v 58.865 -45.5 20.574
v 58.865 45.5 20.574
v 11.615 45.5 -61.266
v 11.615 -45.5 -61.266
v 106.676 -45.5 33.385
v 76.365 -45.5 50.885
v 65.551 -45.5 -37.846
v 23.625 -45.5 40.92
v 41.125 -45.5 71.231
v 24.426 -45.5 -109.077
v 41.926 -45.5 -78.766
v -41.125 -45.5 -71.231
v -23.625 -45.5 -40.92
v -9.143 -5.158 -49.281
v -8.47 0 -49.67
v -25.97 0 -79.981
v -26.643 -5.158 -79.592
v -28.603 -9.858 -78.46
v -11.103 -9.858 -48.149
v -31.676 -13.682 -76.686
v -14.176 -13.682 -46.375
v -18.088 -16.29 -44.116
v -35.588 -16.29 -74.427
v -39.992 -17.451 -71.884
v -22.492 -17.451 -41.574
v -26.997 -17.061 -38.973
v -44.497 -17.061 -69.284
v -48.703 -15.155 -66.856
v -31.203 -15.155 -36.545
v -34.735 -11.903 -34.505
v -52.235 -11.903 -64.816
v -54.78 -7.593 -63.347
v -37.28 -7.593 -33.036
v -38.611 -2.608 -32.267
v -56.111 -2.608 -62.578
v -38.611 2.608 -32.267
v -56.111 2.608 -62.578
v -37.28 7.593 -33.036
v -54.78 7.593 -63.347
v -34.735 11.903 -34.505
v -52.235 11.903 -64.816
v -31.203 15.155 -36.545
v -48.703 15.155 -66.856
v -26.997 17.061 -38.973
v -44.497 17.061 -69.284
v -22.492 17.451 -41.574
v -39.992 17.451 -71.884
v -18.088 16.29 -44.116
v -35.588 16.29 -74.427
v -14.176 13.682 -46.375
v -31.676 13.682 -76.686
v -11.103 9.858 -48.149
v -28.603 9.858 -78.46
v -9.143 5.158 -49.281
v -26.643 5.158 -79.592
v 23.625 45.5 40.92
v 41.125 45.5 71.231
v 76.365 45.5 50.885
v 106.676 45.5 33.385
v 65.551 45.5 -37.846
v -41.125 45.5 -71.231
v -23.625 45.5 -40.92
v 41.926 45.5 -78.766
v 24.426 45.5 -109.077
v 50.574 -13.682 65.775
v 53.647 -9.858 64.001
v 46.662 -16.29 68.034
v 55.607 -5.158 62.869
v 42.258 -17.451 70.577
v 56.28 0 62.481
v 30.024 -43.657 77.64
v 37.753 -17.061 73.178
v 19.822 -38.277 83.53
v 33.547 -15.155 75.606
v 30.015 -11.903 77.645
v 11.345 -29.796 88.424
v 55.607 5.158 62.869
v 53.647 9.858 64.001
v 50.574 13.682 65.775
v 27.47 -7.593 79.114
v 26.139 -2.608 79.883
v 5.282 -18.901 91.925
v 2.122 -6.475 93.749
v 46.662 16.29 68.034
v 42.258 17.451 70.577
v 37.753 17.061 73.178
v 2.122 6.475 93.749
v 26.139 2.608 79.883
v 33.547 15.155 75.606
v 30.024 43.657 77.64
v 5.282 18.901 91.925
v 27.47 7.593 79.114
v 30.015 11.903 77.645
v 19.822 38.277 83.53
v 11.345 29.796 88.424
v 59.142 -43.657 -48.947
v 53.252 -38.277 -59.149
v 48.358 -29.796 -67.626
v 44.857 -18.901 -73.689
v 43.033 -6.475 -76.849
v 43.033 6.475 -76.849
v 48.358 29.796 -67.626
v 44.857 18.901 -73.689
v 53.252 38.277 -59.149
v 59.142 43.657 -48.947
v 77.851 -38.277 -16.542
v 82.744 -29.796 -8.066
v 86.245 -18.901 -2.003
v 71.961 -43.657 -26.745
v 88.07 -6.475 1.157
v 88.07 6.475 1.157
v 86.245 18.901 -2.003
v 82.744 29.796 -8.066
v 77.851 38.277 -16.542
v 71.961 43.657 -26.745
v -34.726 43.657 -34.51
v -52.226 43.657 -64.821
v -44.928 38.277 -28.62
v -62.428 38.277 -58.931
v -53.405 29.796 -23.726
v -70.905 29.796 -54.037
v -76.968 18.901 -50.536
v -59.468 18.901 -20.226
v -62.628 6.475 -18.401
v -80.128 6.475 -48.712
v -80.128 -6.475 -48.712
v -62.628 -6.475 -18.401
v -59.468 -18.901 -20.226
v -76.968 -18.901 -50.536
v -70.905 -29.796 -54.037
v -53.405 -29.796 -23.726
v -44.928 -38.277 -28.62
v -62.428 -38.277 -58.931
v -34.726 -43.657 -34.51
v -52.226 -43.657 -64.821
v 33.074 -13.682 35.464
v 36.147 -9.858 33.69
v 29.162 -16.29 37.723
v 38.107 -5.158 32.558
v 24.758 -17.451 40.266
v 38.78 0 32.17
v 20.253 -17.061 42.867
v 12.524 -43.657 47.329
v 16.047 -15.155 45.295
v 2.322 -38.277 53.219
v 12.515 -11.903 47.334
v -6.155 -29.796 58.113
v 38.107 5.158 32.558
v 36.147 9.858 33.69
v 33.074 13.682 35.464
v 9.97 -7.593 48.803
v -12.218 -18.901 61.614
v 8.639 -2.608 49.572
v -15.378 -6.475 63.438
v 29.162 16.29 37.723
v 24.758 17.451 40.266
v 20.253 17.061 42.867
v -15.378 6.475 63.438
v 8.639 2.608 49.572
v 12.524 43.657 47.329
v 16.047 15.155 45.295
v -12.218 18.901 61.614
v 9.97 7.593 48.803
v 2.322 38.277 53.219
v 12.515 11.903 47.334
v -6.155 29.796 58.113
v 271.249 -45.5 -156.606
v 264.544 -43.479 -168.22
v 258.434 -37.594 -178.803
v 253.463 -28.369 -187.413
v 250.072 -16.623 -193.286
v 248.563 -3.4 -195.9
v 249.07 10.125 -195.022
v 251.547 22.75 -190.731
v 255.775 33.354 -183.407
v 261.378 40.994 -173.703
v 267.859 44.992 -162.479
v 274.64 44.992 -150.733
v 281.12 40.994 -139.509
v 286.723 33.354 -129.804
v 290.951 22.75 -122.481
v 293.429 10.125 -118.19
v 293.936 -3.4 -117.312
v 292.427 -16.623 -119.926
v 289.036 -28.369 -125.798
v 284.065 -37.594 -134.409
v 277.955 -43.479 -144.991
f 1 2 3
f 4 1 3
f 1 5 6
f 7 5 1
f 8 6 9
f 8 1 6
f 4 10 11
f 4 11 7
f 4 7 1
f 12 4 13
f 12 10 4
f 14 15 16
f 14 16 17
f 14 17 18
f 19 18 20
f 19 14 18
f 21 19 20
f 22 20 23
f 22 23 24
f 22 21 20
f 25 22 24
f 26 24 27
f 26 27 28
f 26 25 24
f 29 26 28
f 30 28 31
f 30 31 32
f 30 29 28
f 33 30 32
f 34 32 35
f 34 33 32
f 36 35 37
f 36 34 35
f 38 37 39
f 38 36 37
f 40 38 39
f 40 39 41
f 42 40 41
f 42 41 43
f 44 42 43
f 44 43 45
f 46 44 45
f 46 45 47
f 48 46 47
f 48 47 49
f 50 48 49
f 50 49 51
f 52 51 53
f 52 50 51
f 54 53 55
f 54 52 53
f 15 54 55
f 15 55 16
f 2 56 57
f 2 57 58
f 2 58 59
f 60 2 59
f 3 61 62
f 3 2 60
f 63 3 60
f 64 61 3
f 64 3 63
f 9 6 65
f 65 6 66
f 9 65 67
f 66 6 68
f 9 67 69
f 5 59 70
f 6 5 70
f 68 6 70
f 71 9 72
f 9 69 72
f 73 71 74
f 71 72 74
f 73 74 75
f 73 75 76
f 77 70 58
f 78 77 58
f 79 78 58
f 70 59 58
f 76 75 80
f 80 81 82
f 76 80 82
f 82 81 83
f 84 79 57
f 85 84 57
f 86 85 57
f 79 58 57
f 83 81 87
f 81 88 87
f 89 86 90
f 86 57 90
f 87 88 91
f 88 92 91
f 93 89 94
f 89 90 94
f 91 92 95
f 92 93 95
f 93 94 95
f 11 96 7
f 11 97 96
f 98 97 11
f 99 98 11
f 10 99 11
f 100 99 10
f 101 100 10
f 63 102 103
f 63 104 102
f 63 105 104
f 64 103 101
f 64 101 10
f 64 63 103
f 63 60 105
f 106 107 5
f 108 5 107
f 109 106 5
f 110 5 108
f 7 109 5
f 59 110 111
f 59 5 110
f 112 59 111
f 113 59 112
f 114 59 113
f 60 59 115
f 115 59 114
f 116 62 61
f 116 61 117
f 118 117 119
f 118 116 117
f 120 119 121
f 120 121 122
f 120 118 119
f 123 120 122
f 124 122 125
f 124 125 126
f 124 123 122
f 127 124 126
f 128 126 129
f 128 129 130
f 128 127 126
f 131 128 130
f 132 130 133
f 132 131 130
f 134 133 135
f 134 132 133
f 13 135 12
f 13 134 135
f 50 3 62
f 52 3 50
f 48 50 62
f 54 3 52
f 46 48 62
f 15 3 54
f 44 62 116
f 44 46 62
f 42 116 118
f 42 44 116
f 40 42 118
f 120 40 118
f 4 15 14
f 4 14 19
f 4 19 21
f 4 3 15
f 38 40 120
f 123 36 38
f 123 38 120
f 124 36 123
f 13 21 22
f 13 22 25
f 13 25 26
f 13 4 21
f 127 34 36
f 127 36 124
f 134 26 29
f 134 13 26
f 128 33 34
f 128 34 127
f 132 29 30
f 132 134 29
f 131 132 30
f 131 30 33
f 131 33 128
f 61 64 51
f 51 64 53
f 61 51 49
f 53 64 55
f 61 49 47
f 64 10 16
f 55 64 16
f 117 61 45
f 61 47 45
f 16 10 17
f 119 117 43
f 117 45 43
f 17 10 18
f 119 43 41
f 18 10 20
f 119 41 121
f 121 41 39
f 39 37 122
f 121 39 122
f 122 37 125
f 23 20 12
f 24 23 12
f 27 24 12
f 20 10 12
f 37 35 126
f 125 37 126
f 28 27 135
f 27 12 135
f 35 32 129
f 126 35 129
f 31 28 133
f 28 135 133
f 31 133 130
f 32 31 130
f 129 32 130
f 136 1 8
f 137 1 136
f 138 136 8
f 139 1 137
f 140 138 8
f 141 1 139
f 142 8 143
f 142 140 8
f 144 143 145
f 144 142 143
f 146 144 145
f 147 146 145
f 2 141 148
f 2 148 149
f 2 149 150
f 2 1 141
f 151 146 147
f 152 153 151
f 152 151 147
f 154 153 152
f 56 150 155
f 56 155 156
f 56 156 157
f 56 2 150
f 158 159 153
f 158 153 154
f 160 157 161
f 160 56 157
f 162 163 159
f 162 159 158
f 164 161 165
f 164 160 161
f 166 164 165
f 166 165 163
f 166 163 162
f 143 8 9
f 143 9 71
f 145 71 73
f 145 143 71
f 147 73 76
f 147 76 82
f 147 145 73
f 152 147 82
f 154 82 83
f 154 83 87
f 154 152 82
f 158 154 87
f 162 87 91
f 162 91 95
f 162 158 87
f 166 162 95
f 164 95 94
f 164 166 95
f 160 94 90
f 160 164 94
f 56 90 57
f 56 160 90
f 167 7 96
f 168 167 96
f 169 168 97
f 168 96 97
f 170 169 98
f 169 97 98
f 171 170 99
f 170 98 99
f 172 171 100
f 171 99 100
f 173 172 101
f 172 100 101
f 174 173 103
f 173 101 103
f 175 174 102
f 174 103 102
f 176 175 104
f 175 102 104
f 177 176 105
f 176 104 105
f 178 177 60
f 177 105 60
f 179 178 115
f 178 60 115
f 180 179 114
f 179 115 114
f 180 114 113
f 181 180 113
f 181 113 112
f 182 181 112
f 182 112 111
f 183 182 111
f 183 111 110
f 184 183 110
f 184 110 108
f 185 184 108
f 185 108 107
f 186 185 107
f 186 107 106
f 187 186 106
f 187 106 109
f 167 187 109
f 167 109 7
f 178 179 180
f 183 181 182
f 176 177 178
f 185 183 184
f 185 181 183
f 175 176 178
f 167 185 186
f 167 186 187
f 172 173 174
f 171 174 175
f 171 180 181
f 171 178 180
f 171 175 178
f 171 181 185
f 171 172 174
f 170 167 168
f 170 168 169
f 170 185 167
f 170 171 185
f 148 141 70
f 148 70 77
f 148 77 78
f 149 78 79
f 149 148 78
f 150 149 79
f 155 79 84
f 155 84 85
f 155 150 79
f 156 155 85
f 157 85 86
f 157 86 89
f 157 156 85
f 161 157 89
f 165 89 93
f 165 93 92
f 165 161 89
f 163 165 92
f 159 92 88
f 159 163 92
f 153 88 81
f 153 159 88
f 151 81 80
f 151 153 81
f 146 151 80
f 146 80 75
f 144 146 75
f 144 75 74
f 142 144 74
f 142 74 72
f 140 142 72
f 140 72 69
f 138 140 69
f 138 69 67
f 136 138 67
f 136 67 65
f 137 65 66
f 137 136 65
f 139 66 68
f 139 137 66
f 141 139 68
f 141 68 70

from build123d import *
from build123d.topology import SkipClean

# Parameters (mm, degrees)
BOSS_EXTRUDE1_DEPTH = 25
SKETCH2_R           = 8
CUT_EXTRUDE1_DEPTH  = 110
CUT_EXTRUDE2_DEPTH  = 150
BOSS_EXTRUDE2_START = 21.60254038
BOSS_EXTRUDE2_DEPTH = 21.60254038
SKETCH5_R           = 13
CUT_EXTRUDE3_DEPTH  = 50
SKETCH6_R           = 13
BOSS_EXTRUDE3_DEPTH = 100
SKETCH7_R           = 5
CUT_EXTRUDE4_DEPTH  = 50
SKETCH8_R           = 13
SKETCH8_R_2         = 5
BOSS_EXTRUDE4_DEPTH = 13
CUT_EXTRUDE5_DEPTH  = 28
SKETCH10_R          = 5
BOSS_EXTRUDE5_DEPTH = 10
CIRPATTERN2_COUNT   = 2
SKETCH11_W          = 47
SKETCH11_H          = 26
BOSS_EXTRUDE6_DEPTH = 10
SKETCH12_R          = 13
BOSS_EXTRUDE7_DEPTH = 67.86279097
SCALE1_SCALE        = 3.5


with BuildPart() as part:
    # Sketch1 → Boss-Extrude1 (new, symmetric)
    with BuildSketch(Plane(origin=(0, 0, 0), x_dir=(1, 0, 0), z_dir=(0, 1, 0))):
        Polygon((86.602540378, 150), (103.923048454, 160), (114.724318643, 141.291651246), (93.073683549, 128.791651246), (158.073683549, 16.208348754), (179.724318643, 28.708348754), (190.525588833, 10), (173.205080757, 0), (45.59802172, 0), (22.79901086, 39.489045172), align=None)
    extrude(amount=BOSS_EXTRUDE1_DEPTH, both=True)

    # Sketch2 → Cut-Extrude1 (cut, symmetric)
    with BuildSketch(Plane(origin=(140.729128115, 0, -81.25), x_dir=(0.8660254037844386, 0, -0.5000000000000003), z_dir=(0.5000000000000003, 0, 0.8660254037844386))):
        Circle(SKETCH2_R)
    extrude(amount=CUT_EXTRUDE1_DEPTH, both=True, mode=Mode.SUBTRACT)

    # Sketch3 → Cut-Extrude2 (cut, symmetric)
    with BuildSketch(Plane(origin=(140.729128115, 0, -81.25), x_dir=(0.8660254037844386, 0, -0.5000000000000003), z_dir=(0.5000000000000003, 0, 0.8660254037844386))):
        with BuildLine():
            Line((0, 18), (-12.5, 18))
            Line((-12.5, 18), (-12.5, 31.312178452))
            Line((-12.5, 31.312178452), (23.905899442, 31.312178452))
            Line((23.905899442, 31.312178452), (23.905899442, -29.505210198))
            Line((23.905899442, -29.505210198), (-12.5, -29.505210198))
            Line((-12.5, -29.505210198), (-12.5, -18))
            Line((-12.5, -18), (0, -18))
            ThreePointArc((0, -18), (18, 0), (0, 18))
        make_face()
    extrude(amount=CUT_EXTRUDE2_DEPTH, both=True, mode=Mode.SUBTRACT)

    # Sketch4 → Boss-Extrude2 (add)
    with SkipClean():  # the faces are left unmerged after this step: merging them gives an invalid solid
        with BuildSketch(Plane(origin=(173.229128115, 0, -24.958348754), x_dir=(0.8660254037844386, 0, -0.5000000000000003), z_dir=(0.5000000000000003, 0, 0.8660254037844386)).offset(BOSS_EXTRUDE2_START)):
            with BuildLine():
                Line((7.5, 16.363068172), (7.5, 2.783882181))
                ThreePointArc((7.5, 2.783882181), (8, 0), (7.5, -2.783882181))
                Line((7.5, -2.783882181), (7.5, -16.363068172))
                ThreePointArc((7.5, -16.363068172), (18, 0), (7.5, 16.363068172))
            make_face()
        boss_extrude2 = extrude(amount=-BOSS_EXTRUDE2_DEPTH)

    # Mirror2: Boss-Extrude2 across plane
    with SkipClean():  # the faces are left unmerged after this step: merging them gives an invalid solid
        add(boss_extrude2.mirror(Plane(origin=(140.729128115, 0, -81.25), x_dir=(-0.8660254037844388, 0, 0.5), z_dir=(0.5000000000000003, 0, 0.8660254037844386))))

    # Sketch5 → Cut-Extrude3 (cut)
    with SkipClean():  # the faces are left unmerged after this step: merging them gives an invalid solid
        with BuildSketch(Plane(origin=(34.19851629, 0, -19.744522586), x_dir=(0.5000000000000001, 0, 0.8660254037844386), z_dir=(-0.8660254037844386, 0, 0.5000000000000001))):
            Circle(SKETCH5_R)
        extrude(amount=-CUT_EXTRUDE3_DEPTH, mode=Mode.SUBTRACT)


with BuildPart() as body_2:
    # Sketch6 → Boss-Extrude3 (new body)
    with BuildSketch(Plane(origin=(77.499786479, 0, -44.744522586), x_dir=(0.5000000000000001, 0, 0.8660254037844386), z_dir=(-0.8660254037844386, 0, 0.5000000000000001))):
        Circle(SKETCH6_R)
    extrude(amount=BOSS_EXTRUDE3_DEPTH)

    # Sketch7 → Cut-Extrude4 (cut, symmetric)
    with BuildSketch(Plane(origin=(140.729128115, 0, -81.25), x_dir=(0.8660254037844386, 0, -0.5000000000000003), z_dir=(0.5000000000000003, 0, 0.8660254037844386))):
        with Locations((-162.5, 0)):
            Circle(SKETCH7_R)
    extrude(amount=CUT_EXTRUDE4_DEPTH, both=True, mode=Mode.SUBTRACT)

    # Sketch8 → Boss-Extrude4 (add, symmetric)
    with BuildSketch(Plane(origin=(140.729128115, 0, -81.25), x_dir=(0.8660254037844386, 0, -0.5000000000000003), z_dir=(0.5000000000000003, 0, 0.8660254037844386))):
        with Locations((-162.5, 0)):
            Circle(SKETCH8_R)
        with Locations((-162.5, 0)):
            Circle(SKETCH8_R_2, mode=Mode.SUBTRACT)
    extrude(amount=BOSS_EXTRUDE4_DEPTH, both=True)

    # Sketch9 → Cut-Extrude5 (cut, symmetric)
    with BuildSketch(Plane(origin=(140.729128115, 0, -81.25), x_dir=(0.8660254037844386, 0, -0.5000000000000003), z_dir=(0.5000000000000003, 0, 0.8660254037844386))):
        with BuildLine():
            Line((-162.5, 13), (-162.5, 18.834095503))
            ThreePointArc((-162.5, 18.834095503), (-181.334095503, 0), (-162.5, -18.834095503))
            Line((-162.5, -18.834095503), (-162.5, -13))
            ThreePointArc((-162.5, -13), (-175.5, 0), (-162.5, 13))
        make_face()
    extrude(amount=CUT_EXTRUDE5_DEPTH, both=True, mode=Mode.SUBTRACT)


with BuildPart() as body_2_2:
    # Sketch10 → Boss-Extrude5 (new body)
    with BuildSketch(Plane(origin=(6.75, 0, 11.691342951), x_dir=(0.8660254037844385, 0, -0.5000000000000004), z_dir=(0.5000000000000003, 0, 0.8660254037844384))):
        with BuildLine():
            Line((0, 13), (21.626254201, 13))
            Line((21.626254201, 13), (21.626254201, -13))
            Line((21.626254201, -13), (0, -13))
            ThreePointArc((0, -13), (-13, 0), (0, 13))
        make_face()
        Circle(SKETCH10_R, mode=Mode.SUBTRACT)
    extrude(amount=BOSS_EXTRUDE5_DEPTH)


with BuildPart() as cirpattern2_1:
    # CirPattern2: pattern copy
    add(body_2_2.part.rotate(Axis((24.24994662, 0, -14.000713209), (0.8660254037844386, 0, -0.5000000000000003)), 1 * 360 / CIRPATTERN2_COUNT))


with BuildPart() as body_4:
    # Sketch11 → Boss-Extrude6 (new body)
    with BuildSketch(Plane(origin=(18.728885527, 0, -10.8131271), x_dir=(-0.5000000000000004, 0, -0.8660254037844385), z_dir=(0.8660254037844384, 0, -0.5000000000000003))):
        Rectangle(SKETCH11_W, SKETCH11_H)
    extrude(amount=-BOSS_EXTRUDE6_DEPTH)


with BuildPart() as body_5:
    # Sketch12 → Boss-Extrude7 (new body)
    with BuildSketch(Plane(origin=(18.728885527, 0, -10.8131271), x_dir=(-0.5000000000000004, 0, -0.8660254037844385), z_dir=(0.8660254037844384, 0, -0.5000000000000003))):
        Circle(SKETCH12_R)
    extrude(amount=BOSS_EXTRUDE7_DEPTH)


with BuildPart() as cirpattern2_1_1:
    add(cirpattern2_1.part)

    # Combine2: union body 4, body 5, body 2 2
    add(body_4.part)
    add(body_5.part)
    add(body_2_2.part)


with BuildPart() as cirpattern2_1_2:
    # Scale1: scaled about (0, 0, 0)
    add(cirpattern2_1_1.part.scale(SCALE1_SCALE))


solid = cirpattern2_1_2.part
